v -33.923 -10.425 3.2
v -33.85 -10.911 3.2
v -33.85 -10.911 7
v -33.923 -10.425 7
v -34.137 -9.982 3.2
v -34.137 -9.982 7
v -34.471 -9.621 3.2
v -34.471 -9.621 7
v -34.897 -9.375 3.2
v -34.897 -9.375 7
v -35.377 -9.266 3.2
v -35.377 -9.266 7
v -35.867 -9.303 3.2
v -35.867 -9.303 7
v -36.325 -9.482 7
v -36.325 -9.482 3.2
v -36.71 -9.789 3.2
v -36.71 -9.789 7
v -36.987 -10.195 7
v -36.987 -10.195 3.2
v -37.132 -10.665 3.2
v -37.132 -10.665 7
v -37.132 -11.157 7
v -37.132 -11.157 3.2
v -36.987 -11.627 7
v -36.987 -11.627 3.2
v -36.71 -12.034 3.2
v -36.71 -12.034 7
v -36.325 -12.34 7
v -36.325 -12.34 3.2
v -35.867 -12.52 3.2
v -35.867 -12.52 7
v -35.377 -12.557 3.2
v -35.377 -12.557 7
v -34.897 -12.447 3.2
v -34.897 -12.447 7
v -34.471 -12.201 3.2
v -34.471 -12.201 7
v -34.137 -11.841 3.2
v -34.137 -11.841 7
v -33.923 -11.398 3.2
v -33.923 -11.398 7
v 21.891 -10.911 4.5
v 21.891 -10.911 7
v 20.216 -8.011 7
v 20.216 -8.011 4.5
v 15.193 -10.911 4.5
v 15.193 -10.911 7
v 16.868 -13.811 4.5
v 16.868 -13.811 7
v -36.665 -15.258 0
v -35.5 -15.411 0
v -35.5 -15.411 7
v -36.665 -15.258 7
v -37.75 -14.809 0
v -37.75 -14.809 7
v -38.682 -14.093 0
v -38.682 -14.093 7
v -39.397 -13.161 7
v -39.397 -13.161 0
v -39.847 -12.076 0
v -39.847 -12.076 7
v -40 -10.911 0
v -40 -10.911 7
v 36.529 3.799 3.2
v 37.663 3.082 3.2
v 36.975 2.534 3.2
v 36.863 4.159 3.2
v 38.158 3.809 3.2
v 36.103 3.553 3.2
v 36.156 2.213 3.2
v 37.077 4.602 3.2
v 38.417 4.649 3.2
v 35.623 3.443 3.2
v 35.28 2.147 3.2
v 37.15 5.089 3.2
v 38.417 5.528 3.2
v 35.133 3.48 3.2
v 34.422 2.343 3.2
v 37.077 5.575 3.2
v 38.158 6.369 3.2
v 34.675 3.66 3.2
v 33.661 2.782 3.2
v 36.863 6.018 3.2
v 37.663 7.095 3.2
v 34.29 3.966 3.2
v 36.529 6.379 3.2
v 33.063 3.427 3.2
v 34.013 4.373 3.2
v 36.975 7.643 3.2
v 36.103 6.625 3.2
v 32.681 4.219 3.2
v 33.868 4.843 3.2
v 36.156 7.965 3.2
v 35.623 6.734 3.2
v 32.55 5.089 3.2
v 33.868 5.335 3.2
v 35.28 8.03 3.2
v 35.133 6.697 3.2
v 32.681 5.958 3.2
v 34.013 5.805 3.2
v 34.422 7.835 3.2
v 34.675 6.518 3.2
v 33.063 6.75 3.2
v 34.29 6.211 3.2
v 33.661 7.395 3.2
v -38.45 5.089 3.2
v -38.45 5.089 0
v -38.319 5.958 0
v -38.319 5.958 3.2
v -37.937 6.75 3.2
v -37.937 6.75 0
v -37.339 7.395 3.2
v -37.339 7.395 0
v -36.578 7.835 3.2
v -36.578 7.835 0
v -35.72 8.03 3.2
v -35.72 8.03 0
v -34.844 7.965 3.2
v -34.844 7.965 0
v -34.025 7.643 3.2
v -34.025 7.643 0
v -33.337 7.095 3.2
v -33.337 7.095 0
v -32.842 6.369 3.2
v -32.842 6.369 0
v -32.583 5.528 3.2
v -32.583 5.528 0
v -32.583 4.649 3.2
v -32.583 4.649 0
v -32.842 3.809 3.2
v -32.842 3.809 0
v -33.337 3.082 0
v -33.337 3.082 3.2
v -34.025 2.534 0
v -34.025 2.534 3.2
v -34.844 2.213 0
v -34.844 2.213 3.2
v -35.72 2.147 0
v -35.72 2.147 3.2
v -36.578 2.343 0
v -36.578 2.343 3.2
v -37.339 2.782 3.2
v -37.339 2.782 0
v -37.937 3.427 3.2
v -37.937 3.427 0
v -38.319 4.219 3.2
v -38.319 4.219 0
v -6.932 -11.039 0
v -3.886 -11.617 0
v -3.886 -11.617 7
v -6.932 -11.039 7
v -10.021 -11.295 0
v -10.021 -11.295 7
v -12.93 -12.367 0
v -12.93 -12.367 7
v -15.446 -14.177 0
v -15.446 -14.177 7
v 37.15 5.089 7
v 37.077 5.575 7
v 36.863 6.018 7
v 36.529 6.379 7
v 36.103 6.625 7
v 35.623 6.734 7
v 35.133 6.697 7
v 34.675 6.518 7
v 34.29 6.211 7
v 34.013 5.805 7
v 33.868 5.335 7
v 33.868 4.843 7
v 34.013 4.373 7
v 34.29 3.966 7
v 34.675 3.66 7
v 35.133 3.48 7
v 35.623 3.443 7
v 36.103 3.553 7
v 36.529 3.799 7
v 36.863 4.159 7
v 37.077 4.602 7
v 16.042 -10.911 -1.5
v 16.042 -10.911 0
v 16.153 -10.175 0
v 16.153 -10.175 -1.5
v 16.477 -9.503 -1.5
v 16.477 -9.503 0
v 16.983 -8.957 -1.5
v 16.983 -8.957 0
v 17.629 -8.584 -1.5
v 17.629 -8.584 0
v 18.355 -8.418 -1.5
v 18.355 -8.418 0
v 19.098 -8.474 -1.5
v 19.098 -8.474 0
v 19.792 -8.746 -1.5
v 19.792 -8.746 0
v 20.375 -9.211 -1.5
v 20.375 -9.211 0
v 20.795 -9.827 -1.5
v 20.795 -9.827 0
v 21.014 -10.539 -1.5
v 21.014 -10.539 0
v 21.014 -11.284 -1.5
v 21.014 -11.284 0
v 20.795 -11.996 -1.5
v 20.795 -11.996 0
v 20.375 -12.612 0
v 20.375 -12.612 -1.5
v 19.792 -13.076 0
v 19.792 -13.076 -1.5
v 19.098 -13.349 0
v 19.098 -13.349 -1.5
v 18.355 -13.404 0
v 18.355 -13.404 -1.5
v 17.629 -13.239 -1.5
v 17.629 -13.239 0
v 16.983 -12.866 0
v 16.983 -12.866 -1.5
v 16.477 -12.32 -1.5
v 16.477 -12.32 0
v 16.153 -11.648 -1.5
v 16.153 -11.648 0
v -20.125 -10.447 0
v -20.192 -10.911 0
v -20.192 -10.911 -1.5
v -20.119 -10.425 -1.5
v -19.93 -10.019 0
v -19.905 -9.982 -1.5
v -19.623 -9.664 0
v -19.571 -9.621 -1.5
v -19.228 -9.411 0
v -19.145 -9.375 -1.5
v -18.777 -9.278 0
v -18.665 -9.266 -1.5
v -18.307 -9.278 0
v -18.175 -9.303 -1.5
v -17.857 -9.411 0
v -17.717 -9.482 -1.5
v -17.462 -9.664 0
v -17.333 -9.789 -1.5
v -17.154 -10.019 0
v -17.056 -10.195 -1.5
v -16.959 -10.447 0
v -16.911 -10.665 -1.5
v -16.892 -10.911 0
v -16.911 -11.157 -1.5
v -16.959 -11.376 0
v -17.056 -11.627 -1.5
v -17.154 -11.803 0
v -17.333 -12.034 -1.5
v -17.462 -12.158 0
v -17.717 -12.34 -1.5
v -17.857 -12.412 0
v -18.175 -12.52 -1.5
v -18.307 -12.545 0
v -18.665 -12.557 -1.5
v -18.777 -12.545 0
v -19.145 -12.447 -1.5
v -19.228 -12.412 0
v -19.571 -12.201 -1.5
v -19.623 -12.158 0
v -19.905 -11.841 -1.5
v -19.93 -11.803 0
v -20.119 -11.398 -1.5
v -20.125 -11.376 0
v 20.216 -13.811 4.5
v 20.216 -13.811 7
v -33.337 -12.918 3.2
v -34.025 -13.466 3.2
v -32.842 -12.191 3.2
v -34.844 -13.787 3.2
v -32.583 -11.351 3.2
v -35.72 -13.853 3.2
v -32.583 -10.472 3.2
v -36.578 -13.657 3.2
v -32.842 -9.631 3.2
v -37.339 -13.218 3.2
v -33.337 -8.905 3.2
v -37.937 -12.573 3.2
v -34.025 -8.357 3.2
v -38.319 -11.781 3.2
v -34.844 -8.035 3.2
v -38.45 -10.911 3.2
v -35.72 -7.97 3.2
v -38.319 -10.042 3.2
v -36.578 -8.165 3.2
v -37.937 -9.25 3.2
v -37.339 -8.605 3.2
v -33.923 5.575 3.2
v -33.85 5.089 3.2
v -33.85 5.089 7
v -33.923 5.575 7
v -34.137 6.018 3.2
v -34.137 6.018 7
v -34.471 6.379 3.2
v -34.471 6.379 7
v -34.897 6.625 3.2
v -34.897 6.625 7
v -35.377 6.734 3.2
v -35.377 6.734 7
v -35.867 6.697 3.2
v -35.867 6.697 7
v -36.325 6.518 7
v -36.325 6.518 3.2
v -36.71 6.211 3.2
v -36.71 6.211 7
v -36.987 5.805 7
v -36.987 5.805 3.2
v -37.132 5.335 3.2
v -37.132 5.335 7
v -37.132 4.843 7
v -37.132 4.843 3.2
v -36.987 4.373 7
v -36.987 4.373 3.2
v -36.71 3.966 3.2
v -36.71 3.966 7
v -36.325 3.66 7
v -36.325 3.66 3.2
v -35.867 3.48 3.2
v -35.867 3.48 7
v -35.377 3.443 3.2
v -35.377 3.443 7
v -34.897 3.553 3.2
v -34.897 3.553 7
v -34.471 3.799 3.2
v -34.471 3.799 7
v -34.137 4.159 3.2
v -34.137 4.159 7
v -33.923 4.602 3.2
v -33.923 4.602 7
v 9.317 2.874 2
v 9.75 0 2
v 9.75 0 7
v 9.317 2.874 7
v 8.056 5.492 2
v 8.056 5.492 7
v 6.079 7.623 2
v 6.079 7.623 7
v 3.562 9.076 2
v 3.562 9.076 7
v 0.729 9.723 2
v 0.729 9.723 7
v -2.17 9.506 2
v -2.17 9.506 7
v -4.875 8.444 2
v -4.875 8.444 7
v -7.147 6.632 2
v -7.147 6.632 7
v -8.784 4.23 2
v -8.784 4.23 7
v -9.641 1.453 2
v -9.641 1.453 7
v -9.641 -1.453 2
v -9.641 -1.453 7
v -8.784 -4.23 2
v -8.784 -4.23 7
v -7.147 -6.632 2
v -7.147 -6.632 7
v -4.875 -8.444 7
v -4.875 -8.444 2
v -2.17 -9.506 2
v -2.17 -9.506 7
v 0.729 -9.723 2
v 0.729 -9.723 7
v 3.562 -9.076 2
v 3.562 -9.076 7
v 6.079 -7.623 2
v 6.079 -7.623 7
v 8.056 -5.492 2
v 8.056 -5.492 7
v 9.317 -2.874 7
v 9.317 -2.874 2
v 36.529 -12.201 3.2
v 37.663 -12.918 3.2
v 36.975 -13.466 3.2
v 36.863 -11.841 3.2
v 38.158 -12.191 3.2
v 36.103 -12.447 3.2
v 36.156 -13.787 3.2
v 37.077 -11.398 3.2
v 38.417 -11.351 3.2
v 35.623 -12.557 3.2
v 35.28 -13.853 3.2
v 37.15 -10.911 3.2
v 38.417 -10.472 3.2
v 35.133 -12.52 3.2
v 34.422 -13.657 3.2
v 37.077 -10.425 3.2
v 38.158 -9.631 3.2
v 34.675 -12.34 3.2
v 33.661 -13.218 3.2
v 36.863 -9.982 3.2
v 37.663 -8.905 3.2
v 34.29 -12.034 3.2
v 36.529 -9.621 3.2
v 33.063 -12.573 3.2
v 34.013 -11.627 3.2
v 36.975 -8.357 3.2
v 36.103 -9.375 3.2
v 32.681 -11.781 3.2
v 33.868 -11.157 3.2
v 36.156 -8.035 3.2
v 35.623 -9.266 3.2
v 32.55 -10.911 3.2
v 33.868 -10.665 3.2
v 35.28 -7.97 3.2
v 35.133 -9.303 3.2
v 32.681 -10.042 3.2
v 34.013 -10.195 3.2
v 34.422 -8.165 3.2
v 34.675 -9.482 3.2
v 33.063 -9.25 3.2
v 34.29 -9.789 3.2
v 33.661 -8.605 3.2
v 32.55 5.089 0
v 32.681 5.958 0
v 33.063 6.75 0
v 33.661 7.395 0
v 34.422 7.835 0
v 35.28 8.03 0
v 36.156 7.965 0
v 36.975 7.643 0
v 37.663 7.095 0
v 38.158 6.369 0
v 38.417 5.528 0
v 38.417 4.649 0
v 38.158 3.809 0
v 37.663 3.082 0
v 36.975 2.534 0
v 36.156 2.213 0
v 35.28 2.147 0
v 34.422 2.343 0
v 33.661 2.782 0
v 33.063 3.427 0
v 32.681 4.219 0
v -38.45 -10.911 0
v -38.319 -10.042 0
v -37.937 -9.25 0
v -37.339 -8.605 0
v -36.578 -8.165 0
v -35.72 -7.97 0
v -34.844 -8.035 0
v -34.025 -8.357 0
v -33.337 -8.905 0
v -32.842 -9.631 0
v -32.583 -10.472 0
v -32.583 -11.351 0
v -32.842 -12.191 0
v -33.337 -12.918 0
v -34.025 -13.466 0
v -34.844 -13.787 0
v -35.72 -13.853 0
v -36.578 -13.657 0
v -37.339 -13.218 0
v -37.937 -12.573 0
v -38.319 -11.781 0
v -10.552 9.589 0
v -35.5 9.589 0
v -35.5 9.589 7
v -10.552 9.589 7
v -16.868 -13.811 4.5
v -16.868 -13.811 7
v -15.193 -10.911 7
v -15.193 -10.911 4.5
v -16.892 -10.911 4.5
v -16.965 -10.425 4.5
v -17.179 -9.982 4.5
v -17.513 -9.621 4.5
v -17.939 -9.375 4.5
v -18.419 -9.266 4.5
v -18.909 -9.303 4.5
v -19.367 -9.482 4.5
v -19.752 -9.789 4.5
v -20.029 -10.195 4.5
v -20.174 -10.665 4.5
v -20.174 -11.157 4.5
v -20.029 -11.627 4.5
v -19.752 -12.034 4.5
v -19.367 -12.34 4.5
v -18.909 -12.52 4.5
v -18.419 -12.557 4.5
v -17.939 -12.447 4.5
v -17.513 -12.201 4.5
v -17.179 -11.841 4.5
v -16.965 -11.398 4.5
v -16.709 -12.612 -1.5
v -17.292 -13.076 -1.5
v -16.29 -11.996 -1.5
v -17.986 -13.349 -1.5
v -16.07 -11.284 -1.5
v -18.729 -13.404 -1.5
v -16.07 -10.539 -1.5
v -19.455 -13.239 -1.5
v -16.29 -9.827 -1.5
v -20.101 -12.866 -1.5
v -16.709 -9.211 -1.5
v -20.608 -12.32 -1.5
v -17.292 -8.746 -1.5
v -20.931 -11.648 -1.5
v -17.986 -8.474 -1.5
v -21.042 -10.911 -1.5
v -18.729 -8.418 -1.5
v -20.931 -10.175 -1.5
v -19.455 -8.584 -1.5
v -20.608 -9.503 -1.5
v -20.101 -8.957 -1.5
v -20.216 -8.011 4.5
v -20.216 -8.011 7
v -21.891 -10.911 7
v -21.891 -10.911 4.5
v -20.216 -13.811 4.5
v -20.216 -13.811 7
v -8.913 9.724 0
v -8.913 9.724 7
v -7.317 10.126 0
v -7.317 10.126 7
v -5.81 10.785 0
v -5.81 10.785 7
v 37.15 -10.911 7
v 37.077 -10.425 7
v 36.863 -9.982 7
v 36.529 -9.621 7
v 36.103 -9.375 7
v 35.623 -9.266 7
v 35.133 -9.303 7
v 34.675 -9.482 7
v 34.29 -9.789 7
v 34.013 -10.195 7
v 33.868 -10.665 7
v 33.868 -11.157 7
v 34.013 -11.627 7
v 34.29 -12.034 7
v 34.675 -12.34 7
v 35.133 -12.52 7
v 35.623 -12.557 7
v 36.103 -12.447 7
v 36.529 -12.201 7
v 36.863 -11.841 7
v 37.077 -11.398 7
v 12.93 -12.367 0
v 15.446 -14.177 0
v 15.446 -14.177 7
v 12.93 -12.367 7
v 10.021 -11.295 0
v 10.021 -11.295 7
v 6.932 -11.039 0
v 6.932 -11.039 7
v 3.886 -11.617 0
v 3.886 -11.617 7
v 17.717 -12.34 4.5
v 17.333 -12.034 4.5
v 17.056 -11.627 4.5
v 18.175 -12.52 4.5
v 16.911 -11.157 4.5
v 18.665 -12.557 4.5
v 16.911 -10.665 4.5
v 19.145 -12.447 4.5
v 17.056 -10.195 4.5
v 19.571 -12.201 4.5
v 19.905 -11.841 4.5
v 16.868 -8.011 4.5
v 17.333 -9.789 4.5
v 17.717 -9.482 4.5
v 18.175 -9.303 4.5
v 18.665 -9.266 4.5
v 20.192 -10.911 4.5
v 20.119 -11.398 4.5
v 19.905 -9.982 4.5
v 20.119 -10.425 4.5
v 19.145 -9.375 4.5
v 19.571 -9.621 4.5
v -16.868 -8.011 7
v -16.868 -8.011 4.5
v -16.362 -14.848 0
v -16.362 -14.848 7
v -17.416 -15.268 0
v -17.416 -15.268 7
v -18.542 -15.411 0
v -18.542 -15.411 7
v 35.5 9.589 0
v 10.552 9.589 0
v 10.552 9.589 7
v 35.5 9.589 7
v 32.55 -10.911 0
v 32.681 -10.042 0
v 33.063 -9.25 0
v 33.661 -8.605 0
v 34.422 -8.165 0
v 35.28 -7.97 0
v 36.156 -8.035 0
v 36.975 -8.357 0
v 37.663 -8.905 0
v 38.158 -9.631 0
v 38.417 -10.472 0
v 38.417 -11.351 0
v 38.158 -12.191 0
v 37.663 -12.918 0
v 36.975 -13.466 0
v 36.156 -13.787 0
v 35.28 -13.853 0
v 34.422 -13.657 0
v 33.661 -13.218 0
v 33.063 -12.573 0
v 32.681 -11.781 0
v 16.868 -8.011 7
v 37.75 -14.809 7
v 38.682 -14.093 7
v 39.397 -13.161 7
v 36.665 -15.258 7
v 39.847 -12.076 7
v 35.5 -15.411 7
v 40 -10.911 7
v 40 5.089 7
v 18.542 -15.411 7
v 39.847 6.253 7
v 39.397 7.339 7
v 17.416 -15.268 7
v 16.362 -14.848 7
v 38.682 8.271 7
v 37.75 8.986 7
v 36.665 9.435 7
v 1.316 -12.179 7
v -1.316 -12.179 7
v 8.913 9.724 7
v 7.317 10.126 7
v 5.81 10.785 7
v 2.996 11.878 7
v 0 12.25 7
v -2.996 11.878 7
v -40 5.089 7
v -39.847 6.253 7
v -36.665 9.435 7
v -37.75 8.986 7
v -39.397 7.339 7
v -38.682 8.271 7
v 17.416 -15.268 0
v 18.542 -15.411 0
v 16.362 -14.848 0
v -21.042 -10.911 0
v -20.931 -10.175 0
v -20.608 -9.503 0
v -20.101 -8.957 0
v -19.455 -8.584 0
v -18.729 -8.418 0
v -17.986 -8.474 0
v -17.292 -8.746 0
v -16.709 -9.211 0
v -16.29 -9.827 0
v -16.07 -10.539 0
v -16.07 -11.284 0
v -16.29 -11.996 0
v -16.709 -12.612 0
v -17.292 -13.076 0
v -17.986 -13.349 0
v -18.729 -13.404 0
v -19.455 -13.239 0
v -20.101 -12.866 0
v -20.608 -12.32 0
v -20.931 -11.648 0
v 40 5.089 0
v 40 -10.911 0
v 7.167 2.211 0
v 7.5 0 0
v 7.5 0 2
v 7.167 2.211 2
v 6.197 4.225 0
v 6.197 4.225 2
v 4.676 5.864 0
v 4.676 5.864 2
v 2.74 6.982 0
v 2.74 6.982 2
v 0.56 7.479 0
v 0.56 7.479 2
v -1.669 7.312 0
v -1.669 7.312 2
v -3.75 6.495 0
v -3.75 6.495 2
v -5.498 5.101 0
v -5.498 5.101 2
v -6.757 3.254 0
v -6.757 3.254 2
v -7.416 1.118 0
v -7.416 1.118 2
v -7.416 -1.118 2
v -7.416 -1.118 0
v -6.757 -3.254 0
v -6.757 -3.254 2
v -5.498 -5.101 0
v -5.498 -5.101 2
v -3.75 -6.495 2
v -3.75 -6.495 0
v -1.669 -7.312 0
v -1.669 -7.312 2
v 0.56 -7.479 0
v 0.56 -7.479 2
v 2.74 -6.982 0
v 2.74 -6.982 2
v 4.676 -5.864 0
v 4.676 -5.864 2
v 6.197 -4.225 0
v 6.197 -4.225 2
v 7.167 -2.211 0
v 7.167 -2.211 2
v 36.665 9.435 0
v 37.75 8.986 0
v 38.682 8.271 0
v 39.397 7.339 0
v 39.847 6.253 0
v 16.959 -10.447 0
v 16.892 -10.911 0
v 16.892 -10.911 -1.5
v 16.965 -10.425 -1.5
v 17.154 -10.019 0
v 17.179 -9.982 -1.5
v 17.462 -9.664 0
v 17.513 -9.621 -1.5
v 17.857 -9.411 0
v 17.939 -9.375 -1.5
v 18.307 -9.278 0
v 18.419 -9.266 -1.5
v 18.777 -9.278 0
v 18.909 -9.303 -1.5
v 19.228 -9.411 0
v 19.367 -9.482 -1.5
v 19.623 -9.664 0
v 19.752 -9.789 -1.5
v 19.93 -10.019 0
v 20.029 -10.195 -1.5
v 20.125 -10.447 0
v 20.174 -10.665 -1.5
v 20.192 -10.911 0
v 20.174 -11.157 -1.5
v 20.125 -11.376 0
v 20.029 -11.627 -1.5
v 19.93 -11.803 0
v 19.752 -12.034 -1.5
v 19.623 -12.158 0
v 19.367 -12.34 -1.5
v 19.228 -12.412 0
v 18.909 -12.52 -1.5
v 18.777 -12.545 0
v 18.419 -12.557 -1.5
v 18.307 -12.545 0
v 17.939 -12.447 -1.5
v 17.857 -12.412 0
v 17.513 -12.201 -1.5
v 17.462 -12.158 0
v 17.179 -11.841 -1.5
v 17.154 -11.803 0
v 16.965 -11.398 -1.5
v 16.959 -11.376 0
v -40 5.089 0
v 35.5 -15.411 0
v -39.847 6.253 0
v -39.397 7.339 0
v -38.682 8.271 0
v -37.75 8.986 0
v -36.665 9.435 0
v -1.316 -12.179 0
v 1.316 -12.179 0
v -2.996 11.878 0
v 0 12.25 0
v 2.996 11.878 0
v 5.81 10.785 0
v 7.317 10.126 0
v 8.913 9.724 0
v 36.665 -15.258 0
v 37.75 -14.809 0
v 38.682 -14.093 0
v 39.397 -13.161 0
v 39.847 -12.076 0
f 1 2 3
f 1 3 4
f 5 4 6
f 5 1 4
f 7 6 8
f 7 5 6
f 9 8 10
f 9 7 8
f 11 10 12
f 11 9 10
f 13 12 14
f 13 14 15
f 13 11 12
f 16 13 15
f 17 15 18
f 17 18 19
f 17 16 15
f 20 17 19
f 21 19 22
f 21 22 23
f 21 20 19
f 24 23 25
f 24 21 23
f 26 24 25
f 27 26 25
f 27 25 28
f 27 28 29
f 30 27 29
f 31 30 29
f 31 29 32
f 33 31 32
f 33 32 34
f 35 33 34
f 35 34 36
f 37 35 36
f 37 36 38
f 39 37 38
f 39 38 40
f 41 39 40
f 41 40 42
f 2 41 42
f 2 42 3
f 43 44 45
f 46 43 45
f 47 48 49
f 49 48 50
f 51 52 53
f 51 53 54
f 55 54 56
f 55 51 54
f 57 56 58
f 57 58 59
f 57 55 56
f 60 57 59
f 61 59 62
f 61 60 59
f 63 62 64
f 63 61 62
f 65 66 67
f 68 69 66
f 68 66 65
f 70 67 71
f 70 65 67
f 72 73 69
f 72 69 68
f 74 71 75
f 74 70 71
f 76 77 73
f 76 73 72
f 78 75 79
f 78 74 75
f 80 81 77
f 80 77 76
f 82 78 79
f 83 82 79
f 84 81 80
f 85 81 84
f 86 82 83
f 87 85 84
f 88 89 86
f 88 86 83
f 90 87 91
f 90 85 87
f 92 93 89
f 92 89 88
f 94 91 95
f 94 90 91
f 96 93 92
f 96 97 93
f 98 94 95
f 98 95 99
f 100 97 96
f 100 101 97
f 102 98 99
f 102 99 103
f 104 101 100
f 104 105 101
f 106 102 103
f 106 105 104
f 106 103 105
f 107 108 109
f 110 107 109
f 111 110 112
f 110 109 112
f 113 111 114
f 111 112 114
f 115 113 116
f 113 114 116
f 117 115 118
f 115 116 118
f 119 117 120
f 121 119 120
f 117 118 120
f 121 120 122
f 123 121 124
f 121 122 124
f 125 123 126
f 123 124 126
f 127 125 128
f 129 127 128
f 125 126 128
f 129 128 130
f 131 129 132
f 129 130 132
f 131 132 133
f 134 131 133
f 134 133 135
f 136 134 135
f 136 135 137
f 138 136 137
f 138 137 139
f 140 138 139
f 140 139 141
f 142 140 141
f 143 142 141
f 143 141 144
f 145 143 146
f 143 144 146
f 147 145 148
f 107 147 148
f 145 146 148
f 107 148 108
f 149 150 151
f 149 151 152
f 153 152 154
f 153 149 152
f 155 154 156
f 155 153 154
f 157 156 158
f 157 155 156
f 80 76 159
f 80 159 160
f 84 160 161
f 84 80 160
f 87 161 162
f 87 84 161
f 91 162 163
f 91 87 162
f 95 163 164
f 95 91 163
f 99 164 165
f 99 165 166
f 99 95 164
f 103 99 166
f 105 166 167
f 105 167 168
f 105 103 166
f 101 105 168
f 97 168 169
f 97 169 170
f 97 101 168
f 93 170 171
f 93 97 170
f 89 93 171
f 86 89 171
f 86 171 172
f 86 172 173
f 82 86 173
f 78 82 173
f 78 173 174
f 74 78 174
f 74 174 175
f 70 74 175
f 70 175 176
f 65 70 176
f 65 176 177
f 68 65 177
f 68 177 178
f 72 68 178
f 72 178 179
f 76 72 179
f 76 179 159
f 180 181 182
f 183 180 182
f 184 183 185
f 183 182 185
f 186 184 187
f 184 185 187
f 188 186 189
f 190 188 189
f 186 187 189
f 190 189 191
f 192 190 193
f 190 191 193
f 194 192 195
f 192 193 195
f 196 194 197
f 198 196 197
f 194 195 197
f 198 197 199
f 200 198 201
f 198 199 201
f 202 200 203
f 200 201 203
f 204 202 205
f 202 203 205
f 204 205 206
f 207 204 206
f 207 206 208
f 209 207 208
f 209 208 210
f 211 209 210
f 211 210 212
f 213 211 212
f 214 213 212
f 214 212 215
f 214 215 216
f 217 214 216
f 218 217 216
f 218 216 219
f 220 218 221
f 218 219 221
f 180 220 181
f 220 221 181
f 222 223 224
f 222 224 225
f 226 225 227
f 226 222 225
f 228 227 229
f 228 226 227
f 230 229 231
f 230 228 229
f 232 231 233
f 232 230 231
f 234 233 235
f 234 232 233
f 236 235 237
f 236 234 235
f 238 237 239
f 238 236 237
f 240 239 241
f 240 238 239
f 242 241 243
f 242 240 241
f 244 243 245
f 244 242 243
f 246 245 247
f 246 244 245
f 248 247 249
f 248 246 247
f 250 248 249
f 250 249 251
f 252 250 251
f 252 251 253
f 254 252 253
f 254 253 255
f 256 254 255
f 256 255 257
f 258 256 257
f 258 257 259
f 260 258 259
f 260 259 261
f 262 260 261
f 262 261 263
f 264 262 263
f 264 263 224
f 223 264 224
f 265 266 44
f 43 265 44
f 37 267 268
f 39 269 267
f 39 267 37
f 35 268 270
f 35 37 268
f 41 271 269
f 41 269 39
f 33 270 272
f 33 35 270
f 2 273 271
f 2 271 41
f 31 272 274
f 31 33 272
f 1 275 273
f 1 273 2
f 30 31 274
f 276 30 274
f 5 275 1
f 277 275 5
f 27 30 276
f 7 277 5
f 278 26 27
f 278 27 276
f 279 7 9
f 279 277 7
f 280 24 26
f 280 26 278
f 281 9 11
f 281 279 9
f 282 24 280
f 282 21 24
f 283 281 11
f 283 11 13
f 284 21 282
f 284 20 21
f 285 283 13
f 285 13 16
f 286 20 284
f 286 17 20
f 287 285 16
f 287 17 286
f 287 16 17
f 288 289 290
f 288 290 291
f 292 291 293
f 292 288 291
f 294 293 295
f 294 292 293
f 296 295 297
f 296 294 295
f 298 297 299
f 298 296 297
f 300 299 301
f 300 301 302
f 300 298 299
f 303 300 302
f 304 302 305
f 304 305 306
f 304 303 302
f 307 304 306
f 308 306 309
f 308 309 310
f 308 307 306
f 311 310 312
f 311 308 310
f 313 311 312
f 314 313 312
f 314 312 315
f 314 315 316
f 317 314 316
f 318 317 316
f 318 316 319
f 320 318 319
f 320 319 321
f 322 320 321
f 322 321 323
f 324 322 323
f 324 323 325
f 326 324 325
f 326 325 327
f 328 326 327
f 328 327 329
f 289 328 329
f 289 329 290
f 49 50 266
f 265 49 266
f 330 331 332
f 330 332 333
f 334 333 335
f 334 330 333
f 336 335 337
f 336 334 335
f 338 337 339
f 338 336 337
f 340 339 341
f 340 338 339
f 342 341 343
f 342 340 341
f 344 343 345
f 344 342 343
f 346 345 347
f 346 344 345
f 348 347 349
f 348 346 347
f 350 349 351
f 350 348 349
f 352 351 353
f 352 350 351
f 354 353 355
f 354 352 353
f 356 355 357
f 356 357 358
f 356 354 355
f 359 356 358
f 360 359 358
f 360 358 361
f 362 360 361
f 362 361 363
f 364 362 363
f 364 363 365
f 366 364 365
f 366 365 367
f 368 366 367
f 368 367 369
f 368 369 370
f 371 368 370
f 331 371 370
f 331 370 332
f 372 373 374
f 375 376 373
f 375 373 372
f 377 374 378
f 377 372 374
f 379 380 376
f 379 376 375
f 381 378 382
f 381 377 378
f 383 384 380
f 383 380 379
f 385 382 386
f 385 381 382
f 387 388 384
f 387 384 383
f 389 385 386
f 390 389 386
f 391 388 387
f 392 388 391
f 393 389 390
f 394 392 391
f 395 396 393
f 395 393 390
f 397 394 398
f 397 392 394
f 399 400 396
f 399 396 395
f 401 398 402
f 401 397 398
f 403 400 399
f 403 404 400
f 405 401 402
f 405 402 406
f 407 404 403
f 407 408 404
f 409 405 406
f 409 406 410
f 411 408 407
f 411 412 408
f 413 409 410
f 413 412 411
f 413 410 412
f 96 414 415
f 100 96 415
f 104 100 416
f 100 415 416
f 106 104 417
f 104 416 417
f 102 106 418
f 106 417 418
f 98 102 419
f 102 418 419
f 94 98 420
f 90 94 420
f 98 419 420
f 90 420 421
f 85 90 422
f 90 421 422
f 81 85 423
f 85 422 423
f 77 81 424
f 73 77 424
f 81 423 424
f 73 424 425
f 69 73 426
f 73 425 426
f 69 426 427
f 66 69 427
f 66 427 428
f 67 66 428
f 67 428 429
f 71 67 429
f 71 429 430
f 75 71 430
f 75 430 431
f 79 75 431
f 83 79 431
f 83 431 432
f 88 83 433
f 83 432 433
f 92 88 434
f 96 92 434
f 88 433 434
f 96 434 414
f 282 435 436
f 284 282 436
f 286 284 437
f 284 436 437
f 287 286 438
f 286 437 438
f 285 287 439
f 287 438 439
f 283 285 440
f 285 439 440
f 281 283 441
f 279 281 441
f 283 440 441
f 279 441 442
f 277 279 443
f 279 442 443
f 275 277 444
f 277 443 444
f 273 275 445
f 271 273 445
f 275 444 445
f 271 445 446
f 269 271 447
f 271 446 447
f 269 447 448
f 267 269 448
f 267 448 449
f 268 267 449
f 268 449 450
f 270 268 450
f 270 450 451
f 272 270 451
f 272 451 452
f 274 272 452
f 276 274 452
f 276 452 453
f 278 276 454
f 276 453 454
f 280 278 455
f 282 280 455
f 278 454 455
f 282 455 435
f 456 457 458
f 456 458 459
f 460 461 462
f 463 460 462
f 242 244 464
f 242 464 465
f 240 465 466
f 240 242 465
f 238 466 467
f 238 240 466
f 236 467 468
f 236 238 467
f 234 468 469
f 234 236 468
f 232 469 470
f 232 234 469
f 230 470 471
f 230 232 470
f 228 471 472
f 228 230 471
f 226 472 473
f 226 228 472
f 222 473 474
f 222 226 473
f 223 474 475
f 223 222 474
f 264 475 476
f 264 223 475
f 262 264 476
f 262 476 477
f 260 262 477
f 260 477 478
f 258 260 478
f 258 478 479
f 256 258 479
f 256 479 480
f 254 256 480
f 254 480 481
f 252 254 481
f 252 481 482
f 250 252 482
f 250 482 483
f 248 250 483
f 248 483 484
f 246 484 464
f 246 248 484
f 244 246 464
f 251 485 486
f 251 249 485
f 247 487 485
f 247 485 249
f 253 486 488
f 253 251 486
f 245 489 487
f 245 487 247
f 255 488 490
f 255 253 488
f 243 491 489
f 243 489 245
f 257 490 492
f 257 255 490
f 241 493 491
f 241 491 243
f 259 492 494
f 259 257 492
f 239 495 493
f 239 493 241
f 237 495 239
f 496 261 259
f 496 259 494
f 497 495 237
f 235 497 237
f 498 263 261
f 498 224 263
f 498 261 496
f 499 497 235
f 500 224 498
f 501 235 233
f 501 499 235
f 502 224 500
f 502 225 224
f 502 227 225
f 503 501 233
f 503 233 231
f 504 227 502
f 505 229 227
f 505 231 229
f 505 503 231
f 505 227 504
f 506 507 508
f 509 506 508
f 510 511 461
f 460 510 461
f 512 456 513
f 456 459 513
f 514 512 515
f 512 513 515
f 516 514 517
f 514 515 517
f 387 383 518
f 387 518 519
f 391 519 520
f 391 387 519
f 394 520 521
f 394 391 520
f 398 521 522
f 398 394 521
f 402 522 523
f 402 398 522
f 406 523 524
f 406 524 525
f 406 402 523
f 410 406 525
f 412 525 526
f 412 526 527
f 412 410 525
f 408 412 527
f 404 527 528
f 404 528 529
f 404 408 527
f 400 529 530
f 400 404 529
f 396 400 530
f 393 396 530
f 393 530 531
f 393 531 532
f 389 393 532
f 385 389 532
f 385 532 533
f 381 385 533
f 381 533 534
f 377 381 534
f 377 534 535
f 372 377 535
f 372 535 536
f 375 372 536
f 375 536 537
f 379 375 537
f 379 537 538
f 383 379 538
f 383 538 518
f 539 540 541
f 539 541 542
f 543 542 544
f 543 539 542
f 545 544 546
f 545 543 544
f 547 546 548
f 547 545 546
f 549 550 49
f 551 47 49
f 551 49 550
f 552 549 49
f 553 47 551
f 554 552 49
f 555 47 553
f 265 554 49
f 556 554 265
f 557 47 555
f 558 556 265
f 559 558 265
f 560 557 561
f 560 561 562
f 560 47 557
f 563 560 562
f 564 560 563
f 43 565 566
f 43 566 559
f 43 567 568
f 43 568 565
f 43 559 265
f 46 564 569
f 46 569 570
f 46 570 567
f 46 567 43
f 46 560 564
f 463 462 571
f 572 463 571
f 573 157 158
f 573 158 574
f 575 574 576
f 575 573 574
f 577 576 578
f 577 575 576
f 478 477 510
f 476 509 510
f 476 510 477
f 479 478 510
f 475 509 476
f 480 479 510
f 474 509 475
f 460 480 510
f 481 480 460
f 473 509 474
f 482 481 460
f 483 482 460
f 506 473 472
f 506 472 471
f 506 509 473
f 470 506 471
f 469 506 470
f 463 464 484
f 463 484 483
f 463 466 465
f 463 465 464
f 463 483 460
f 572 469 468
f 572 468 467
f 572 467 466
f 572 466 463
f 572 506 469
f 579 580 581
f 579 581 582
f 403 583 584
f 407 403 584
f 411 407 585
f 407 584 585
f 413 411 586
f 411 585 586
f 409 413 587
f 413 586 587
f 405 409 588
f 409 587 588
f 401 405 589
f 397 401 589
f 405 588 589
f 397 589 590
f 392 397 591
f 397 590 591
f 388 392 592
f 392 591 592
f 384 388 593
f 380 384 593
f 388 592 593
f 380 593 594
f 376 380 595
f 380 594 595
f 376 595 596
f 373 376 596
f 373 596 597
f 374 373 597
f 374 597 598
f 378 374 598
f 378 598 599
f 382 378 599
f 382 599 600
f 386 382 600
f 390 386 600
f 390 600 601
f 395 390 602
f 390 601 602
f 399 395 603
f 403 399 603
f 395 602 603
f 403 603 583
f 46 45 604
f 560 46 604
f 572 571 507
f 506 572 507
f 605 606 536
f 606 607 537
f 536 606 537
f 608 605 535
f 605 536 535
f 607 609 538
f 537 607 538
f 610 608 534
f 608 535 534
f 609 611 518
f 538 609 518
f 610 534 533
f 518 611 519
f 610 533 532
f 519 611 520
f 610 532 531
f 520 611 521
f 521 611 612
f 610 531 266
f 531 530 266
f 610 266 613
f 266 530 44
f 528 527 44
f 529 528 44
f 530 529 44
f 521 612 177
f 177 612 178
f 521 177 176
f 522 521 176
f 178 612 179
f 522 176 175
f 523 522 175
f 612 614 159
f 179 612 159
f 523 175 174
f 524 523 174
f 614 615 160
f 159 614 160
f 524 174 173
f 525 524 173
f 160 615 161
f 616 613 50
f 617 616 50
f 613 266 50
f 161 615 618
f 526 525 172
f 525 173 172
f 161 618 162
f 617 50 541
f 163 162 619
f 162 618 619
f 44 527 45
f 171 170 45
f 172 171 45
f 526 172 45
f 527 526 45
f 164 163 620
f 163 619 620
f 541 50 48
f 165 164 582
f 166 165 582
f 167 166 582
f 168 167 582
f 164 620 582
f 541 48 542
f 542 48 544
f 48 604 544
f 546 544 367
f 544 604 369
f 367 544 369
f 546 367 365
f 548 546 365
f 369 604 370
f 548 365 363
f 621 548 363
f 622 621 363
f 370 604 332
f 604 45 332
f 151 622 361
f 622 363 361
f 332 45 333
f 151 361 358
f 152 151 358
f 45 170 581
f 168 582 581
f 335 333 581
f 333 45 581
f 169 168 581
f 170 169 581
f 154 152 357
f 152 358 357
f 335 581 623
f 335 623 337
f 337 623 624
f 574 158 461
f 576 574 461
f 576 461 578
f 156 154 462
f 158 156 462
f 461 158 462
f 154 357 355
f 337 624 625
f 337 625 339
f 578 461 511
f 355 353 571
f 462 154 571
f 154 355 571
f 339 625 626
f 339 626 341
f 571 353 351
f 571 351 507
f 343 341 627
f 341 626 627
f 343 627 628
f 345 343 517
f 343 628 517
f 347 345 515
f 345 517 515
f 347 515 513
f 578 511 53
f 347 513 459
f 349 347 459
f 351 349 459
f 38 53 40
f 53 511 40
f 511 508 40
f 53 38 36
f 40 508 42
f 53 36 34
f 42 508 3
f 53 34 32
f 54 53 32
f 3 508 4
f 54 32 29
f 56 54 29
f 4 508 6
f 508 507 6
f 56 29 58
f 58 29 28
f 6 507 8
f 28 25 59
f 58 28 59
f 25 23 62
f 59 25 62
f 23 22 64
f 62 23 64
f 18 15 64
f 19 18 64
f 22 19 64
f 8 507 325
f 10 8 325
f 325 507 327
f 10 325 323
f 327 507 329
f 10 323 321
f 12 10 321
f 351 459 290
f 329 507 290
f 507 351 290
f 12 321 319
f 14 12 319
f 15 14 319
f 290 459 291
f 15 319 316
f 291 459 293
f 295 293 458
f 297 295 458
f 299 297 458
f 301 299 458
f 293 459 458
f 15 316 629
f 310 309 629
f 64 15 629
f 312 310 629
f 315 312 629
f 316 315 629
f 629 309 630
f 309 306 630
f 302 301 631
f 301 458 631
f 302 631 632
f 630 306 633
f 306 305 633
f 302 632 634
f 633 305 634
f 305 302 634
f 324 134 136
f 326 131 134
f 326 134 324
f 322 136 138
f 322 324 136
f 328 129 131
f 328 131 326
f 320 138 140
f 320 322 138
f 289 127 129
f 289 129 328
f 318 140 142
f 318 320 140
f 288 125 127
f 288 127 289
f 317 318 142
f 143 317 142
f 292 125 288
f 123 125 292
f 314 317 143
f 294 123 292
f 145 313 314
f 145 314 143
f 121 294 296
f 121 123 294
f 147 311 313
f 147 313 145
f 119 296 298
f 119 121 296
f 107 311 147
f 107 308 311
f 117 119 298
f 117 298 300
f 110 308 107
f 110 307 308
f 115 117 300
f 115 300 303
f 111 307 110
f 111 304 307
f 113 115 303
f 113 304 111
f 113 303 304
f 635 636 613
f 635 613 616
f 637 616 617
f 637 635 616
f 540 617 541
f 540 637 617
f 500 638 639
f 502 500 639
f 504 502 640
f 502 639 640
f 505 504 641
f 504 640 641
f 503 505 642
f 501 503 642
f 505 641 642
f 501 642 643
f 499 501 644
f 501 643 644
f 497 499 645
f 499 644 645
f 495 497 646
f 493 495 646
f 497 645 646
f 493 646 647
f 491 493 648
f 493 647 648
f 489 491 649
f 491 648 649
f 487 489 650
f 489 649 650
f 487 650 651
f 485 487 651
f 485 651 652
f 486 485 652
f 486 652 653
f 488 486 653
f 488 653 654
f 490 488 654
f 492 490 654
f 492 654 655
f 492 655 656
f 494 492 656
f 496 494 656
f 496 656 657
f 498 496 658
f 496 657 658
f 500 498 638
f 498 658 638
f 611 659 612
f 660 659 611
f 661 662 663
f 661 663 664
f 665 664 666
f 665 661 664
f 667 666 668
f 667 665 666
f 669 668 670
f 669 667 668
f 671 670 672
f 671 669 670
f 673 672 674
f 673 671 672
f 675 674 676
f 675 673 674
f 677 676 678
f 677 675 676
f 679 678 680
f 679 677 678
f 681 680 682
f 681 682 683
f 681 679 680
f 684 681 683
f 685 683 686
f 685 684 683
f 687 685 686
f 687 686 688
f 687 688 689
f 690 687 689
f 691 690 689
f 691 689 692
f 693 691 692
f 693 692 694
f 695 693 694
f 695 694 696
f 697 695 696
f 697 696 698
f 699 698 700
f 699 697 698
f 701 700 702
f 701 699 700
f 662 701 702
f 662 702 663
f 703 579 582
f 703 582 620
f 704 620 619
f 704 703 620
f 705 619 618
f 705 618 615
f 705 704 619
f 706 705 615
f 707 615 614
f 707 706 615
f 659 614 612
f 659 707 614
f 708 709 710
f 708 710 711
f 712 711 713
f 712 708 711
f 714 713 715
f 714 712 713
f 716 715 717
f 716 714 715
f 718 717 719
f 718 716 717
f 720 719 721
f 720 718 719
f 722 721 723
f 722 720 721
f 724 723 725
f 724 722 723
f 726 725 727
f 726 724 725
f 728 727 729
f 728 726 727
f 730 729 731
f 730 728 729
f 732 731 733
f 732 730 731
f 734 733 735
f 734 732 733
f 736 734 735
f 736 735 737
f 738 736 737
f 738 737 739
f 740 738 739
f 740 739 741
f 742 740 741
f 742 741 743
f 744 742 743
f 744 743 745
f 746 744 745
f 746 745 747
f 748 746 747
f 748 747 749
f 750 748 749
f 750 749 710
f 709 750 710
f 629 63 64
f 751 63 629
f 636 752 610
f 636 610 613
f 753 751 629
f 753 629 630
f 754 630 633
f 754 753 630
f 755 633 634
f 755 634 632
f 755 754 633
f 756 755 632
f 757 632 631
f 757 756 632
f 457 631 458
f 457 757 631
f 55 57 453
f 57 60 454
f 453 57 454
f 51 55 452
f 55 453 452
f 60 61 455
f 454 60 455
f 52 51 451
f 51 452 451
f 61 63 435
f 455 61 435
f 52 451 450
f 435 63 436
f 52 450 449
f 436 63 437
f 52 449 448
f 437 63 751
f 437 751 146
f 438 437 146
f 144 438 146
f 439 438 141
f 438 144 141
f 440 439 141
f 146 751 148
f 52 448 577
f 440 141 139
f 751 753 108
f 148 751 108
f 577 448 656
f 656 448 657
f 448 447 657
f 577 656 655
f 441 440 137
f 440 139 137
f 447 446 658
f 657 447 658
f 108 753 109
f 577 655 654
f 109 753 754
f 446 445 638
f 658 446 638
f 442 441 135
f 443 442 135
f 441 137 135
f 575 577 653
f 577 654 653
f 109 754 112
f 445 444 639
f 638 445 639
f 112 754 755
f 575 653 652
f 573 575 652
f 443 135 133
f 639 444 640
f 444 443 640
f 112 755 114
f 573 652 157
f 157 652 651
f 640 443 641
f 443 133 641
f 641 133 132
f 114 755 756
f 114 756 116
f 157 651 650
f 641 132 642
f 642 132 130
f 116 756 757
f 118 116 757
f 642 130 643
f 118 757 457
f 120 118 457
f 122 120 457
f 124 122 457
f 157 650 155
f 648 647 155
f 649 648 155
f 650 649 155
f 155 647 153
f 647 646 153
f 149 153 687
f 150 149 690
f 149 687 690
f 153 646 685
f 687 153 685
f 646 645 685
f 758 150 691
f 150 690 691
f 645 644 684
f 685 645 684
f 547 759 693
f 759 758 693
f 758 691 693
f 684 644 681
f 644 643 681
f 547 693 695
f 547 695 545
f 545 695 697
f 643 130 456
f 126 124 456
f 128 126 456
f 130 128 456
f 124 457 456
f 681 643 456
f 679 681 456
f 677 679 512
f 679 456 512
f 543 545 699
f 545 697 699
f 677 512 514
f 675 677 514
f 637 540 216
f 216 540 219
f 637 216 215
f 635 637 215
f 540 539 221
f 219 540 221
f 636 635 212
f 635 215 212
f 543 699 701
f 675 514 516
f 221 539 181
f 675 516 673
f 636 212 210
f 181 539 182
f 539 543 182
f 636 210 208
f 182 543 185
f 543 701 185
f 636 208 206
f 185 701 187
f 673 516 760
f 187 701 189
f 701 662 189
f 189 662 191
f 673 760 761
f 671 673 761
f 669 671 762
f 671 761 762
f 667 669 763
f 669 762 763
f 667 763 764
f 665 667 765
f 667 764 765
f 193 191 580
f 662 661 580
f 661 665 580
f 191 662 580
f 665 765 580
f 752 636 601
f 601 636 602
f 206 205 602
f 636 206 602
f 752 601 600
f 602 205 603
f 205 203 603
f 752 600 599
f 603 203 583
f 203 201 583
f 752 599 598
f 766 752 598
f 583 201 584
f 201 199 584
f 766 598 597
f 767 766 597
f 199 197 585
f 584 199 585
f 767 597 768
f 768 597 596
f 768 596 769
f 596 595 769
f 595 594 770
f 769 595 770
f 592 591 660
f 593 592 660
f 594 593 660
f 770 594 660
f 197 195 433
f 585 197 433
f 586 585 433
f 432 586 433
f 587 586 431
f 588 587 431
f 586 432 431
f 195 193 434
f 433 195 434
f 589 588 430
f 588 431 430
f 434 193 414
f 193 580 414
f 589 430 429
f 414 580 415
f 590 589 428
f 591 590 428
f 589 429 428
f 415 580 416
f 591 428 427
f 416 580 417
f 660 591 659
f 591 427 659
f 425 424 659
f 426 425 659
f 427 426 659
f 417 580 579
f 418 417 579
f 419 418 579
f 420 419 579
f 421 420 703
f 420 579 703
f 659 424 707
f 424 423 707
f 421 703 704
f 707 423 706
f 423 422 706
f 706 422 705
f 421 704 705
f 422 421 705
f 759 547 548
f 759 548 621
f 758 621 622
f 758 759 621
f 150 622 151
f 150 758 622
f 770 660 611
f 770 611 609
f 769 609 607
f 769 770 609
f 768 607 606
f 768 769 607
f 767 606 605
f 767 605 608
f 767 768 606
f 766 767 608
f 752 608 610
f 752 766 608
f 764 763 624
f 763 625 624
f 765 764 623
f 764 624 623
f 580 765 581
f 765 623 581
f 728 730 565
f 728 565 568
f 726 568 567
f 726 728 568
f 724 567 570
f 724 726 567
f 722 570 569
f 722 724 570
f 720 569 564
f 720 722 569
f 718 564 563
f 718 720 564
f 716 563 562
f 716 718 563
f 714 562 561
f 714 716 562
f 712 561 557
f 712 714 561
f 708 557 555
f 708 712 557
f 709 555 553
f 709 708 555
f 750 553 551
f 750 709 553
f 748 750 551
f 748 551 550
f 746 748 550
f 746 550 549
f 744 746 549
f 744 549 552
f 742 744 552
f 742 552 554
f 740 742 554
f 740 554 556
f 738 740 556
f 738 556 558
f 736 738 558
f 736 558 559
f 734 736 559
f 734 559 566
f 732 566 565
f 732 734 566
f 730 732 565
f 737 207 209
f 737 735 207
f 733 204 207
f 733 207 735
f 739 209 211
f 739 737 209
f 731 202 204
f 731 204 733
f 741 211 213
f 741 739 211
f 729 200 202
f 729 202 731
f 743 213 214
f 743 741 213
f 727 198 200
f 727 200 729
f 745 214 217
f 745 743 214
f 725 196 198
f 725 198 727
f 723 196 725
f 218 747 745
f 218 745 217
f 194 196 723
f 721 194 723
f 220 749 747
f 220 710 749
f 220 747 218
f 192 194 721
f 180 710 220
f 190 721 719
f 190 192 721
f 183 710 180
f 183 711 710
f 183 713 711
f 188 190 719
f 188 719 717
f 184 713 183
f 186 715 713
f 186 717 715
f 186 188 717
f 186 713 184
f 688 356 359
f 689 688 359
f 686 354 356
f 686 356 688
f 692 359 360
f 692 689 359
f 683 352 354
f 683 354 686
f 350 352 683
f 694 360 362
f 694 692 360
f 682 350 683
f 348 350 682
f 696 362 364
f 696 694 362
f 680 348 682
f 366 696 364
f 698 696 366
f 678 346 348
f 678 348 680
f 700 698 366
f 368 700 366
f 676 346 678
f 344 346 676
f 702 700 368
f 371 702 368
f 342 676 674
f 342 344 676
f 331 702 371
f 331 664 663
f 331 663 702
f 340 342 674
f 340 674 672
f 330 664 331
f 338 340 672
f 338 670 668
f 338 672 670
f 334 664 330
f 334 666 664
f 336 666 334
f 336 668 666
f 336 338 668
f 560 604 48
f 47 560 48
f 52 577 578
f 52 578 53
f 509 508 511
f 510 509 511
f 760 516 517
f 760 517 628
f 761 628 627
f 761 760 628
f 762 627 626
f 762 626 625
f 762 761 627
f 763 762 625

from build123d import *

# Parameters (mm, degrees)
SKETCH1_R           = 9.75
SKETCH1_R_2         = 1.65
BOSS_EXTRUDE1_DEPTH = 7
FILLET1_R           = 10
SKETCH2_R           = 9.75
SKETCH2_R_2         = 7.5
BOSS_EXTRUDE2_DEPTH = 2
CUT_EXTRUDE1_DEPTH  = 2.5
SKETCH4_R           = 2.5
SKETCH4_R_2         = 1.65
BOSS_EXTRUDE3_DEPTH = 1.5
SKETCH5_R           = 2.95
CUT_EXTRUDE2_DEPTH  = 3.2


with BuildPart() as part:
    # Sketch1 → Boss-Extrude1 (new body)
    with BuildSketch(Plane.XY):
        with BuildLine():
            Line((-35.5, 9.588593938), (-7.623737029, 9.588593938))
            ThreePointArc((-7.623737029, 9.588593938), (0, 12.25), (7.623737029, 9.588593938))
            Line((7.623737029, 9.588593938), (35.5, 9.588593938))
            ThreePointArc((35.5, 9.588593938), (38.681980515, 8.270574454), (40, 5.088593938))
            Line((40, 5.088593938), (40, -10.911406062))
            ThreePointArc((40, -10.911406062), (38.681980515, -14.093386577), (35.5, -15.411406062))
            Line((35.5, -15.411406062), (18.542115282, -15.411406062))
            ThreePointArc((18.542115282, -15.411406062), (16.87570332, -15.091486345), (15.44623271, -14.177215472))
            ThreePointArc((15.44623271, -14.177215472), (10.021005103, -11.295196388), (3.88623271, -11.617215472))
            ThreePointArc((3.88623271, -11.617215472), (0, -12.25), (-3.88623271, -11.617215472))
            ThreePointArc((-3.88623271, -11.617215472), (-10.021005103, -11.295196388), (-15.44623271, -14.177215472))
            ThreePointArc((-15.44623271, -14.177215472), (-16.87570332, -15.091486345), (-18.542115282, -15.411406062))
            Line((-18.542115282, -15.411406062), (-35.5, -15.411406062))
            ThreePointArc((-35.5, -15.411406062), (-38.681980515, -14.093386577), (-40, -10.911406062))
            Line((-40, -10.911406062), (-40, 5.088593938))
            ThreePointArc((-40, 5.088593938), (-38.681980515, 8.270574454), (-35.5, 9.588593938))
        make_face()
        Circle(SKETCH1_R, mode=Mode.SUBTRACT)
        with Locations((-35.5, 5.088593938)):
            Circle(SKETCH1_R_2, mode=Mode.SUBTRACT)
        with Locations((35.5, 5.088593938)):
            Circle(SKETCH1_R_2, mode=Mode.SUBTRACT)
        with Locations((-18.542115282, -10.911406062)):
            Circle(SKETCH1_R_2, mode=Mode.SUBTRACT)
        with Locations((-35.5, -10.911406062)):
            Circle(SKETCH1_R_2, mode=Mode.SUBTRACT)
        with Locations((18.542115282, -10.911406062)):
            Circle(SKETCH1_R_2, mode=Mode.SUBTRACT)
        with Locations((35.5, -10.911406062)):
            Circle(SKETCH1_R_2, mode=Mode.SUBTRACT)
    extrude(amount=BOSS_EXTRUDE1_DEPTH)

    # Fillet1
    fillet1_edges = [part.edges().sort_by_distance(p)[0] for p in [
        (-7.623737029, 9.588593938, 3.5),
        (7.623737029, 9.588593938, 3.5),
    ]]
    fillet(fillet1_edges, radius=FILLET1_R)

    # Sketch2 → Boss-Extrude2 (add)
    with BuildSketch(Plane.XY):
        Circle(SKETCH2_R)
        Circle(SKETCH2_R_2, mode=Mode.SUBTRACT)
    extrude(amount=BOSS_EXTRUDE2_DEPTH)

    # Sketch3 → Cut-Extrude1 (cut)
    with BuildSketch(Plane.XY.offset(7)):
        Polygon((-16.867799501, -8.011406062), (-20.216431062, -8.011406062), (-21.890746843, -10.911406062), (-20.216431062, -13.811406062), (-16.867799501, -13.811406062), (-15.19348372, -10.911406062), align=None)
        Polygon((20.216431062, -8.011406062), (16.867799501, -8.011406062), (15.19348372, -10.911406062), (16.867799501, -13.811406062), (20.216431062, -13.811406062), (21.890746843, -10.911406062), align=None)
    extrude(amount=-CUT_EXTRUDE1_DEPTH, mode=Mode.SUBTRACT)

    # Sketch4 → Boss-Extrude3 (add)
    with BuildSketch(Plane(origin=(0, 0, 0), x_dir=(-1, 0, 0), z_dir=(0, 0, -1))):
        with Locations((-18.542115282, -10.911406062)):
            Circle(SKETCH4_R)
        with Locations((-18.542115282, -10.911406062)):
            Circle(SKETCH4_R_2, mode=Mode.SUBTRACT)
        with Locations((18.542115282, -10.911406062)):
            Circle(SKETCH4_R)
        with Locations((18.542115282, -10.911406062)):
            Circle(SKETCH4_R_2, mode=Mode.SUBTRACT)
    extrude(amount=BOSS_EXTRUDE3_DEPTH)

    # Sketch5 → Cut-Extrude2 (cut)
    with BuildSketch(Plane(origin=(0, 0, 0), x_dir=(-1, 0, 0), z_dir=(0, 0, -1))):
        with Locations((-35.5, 5.088593938)):
            Circle(SKETCH5_R)
        with Locations((-35.5, -10.911406062)):
            Circle(SKETCH5_R)
        with Locations((35.5, 5.088593938)):
            Circle(SKETCH5_R)
        with Locations((35.5, -10.911406062)):
            Circle(SKETCH5_R)
    extrude(amount=-CUT_EXTRUDE2_DEPTH, mode=Mode.SUBTRACT)


solid = part.part
